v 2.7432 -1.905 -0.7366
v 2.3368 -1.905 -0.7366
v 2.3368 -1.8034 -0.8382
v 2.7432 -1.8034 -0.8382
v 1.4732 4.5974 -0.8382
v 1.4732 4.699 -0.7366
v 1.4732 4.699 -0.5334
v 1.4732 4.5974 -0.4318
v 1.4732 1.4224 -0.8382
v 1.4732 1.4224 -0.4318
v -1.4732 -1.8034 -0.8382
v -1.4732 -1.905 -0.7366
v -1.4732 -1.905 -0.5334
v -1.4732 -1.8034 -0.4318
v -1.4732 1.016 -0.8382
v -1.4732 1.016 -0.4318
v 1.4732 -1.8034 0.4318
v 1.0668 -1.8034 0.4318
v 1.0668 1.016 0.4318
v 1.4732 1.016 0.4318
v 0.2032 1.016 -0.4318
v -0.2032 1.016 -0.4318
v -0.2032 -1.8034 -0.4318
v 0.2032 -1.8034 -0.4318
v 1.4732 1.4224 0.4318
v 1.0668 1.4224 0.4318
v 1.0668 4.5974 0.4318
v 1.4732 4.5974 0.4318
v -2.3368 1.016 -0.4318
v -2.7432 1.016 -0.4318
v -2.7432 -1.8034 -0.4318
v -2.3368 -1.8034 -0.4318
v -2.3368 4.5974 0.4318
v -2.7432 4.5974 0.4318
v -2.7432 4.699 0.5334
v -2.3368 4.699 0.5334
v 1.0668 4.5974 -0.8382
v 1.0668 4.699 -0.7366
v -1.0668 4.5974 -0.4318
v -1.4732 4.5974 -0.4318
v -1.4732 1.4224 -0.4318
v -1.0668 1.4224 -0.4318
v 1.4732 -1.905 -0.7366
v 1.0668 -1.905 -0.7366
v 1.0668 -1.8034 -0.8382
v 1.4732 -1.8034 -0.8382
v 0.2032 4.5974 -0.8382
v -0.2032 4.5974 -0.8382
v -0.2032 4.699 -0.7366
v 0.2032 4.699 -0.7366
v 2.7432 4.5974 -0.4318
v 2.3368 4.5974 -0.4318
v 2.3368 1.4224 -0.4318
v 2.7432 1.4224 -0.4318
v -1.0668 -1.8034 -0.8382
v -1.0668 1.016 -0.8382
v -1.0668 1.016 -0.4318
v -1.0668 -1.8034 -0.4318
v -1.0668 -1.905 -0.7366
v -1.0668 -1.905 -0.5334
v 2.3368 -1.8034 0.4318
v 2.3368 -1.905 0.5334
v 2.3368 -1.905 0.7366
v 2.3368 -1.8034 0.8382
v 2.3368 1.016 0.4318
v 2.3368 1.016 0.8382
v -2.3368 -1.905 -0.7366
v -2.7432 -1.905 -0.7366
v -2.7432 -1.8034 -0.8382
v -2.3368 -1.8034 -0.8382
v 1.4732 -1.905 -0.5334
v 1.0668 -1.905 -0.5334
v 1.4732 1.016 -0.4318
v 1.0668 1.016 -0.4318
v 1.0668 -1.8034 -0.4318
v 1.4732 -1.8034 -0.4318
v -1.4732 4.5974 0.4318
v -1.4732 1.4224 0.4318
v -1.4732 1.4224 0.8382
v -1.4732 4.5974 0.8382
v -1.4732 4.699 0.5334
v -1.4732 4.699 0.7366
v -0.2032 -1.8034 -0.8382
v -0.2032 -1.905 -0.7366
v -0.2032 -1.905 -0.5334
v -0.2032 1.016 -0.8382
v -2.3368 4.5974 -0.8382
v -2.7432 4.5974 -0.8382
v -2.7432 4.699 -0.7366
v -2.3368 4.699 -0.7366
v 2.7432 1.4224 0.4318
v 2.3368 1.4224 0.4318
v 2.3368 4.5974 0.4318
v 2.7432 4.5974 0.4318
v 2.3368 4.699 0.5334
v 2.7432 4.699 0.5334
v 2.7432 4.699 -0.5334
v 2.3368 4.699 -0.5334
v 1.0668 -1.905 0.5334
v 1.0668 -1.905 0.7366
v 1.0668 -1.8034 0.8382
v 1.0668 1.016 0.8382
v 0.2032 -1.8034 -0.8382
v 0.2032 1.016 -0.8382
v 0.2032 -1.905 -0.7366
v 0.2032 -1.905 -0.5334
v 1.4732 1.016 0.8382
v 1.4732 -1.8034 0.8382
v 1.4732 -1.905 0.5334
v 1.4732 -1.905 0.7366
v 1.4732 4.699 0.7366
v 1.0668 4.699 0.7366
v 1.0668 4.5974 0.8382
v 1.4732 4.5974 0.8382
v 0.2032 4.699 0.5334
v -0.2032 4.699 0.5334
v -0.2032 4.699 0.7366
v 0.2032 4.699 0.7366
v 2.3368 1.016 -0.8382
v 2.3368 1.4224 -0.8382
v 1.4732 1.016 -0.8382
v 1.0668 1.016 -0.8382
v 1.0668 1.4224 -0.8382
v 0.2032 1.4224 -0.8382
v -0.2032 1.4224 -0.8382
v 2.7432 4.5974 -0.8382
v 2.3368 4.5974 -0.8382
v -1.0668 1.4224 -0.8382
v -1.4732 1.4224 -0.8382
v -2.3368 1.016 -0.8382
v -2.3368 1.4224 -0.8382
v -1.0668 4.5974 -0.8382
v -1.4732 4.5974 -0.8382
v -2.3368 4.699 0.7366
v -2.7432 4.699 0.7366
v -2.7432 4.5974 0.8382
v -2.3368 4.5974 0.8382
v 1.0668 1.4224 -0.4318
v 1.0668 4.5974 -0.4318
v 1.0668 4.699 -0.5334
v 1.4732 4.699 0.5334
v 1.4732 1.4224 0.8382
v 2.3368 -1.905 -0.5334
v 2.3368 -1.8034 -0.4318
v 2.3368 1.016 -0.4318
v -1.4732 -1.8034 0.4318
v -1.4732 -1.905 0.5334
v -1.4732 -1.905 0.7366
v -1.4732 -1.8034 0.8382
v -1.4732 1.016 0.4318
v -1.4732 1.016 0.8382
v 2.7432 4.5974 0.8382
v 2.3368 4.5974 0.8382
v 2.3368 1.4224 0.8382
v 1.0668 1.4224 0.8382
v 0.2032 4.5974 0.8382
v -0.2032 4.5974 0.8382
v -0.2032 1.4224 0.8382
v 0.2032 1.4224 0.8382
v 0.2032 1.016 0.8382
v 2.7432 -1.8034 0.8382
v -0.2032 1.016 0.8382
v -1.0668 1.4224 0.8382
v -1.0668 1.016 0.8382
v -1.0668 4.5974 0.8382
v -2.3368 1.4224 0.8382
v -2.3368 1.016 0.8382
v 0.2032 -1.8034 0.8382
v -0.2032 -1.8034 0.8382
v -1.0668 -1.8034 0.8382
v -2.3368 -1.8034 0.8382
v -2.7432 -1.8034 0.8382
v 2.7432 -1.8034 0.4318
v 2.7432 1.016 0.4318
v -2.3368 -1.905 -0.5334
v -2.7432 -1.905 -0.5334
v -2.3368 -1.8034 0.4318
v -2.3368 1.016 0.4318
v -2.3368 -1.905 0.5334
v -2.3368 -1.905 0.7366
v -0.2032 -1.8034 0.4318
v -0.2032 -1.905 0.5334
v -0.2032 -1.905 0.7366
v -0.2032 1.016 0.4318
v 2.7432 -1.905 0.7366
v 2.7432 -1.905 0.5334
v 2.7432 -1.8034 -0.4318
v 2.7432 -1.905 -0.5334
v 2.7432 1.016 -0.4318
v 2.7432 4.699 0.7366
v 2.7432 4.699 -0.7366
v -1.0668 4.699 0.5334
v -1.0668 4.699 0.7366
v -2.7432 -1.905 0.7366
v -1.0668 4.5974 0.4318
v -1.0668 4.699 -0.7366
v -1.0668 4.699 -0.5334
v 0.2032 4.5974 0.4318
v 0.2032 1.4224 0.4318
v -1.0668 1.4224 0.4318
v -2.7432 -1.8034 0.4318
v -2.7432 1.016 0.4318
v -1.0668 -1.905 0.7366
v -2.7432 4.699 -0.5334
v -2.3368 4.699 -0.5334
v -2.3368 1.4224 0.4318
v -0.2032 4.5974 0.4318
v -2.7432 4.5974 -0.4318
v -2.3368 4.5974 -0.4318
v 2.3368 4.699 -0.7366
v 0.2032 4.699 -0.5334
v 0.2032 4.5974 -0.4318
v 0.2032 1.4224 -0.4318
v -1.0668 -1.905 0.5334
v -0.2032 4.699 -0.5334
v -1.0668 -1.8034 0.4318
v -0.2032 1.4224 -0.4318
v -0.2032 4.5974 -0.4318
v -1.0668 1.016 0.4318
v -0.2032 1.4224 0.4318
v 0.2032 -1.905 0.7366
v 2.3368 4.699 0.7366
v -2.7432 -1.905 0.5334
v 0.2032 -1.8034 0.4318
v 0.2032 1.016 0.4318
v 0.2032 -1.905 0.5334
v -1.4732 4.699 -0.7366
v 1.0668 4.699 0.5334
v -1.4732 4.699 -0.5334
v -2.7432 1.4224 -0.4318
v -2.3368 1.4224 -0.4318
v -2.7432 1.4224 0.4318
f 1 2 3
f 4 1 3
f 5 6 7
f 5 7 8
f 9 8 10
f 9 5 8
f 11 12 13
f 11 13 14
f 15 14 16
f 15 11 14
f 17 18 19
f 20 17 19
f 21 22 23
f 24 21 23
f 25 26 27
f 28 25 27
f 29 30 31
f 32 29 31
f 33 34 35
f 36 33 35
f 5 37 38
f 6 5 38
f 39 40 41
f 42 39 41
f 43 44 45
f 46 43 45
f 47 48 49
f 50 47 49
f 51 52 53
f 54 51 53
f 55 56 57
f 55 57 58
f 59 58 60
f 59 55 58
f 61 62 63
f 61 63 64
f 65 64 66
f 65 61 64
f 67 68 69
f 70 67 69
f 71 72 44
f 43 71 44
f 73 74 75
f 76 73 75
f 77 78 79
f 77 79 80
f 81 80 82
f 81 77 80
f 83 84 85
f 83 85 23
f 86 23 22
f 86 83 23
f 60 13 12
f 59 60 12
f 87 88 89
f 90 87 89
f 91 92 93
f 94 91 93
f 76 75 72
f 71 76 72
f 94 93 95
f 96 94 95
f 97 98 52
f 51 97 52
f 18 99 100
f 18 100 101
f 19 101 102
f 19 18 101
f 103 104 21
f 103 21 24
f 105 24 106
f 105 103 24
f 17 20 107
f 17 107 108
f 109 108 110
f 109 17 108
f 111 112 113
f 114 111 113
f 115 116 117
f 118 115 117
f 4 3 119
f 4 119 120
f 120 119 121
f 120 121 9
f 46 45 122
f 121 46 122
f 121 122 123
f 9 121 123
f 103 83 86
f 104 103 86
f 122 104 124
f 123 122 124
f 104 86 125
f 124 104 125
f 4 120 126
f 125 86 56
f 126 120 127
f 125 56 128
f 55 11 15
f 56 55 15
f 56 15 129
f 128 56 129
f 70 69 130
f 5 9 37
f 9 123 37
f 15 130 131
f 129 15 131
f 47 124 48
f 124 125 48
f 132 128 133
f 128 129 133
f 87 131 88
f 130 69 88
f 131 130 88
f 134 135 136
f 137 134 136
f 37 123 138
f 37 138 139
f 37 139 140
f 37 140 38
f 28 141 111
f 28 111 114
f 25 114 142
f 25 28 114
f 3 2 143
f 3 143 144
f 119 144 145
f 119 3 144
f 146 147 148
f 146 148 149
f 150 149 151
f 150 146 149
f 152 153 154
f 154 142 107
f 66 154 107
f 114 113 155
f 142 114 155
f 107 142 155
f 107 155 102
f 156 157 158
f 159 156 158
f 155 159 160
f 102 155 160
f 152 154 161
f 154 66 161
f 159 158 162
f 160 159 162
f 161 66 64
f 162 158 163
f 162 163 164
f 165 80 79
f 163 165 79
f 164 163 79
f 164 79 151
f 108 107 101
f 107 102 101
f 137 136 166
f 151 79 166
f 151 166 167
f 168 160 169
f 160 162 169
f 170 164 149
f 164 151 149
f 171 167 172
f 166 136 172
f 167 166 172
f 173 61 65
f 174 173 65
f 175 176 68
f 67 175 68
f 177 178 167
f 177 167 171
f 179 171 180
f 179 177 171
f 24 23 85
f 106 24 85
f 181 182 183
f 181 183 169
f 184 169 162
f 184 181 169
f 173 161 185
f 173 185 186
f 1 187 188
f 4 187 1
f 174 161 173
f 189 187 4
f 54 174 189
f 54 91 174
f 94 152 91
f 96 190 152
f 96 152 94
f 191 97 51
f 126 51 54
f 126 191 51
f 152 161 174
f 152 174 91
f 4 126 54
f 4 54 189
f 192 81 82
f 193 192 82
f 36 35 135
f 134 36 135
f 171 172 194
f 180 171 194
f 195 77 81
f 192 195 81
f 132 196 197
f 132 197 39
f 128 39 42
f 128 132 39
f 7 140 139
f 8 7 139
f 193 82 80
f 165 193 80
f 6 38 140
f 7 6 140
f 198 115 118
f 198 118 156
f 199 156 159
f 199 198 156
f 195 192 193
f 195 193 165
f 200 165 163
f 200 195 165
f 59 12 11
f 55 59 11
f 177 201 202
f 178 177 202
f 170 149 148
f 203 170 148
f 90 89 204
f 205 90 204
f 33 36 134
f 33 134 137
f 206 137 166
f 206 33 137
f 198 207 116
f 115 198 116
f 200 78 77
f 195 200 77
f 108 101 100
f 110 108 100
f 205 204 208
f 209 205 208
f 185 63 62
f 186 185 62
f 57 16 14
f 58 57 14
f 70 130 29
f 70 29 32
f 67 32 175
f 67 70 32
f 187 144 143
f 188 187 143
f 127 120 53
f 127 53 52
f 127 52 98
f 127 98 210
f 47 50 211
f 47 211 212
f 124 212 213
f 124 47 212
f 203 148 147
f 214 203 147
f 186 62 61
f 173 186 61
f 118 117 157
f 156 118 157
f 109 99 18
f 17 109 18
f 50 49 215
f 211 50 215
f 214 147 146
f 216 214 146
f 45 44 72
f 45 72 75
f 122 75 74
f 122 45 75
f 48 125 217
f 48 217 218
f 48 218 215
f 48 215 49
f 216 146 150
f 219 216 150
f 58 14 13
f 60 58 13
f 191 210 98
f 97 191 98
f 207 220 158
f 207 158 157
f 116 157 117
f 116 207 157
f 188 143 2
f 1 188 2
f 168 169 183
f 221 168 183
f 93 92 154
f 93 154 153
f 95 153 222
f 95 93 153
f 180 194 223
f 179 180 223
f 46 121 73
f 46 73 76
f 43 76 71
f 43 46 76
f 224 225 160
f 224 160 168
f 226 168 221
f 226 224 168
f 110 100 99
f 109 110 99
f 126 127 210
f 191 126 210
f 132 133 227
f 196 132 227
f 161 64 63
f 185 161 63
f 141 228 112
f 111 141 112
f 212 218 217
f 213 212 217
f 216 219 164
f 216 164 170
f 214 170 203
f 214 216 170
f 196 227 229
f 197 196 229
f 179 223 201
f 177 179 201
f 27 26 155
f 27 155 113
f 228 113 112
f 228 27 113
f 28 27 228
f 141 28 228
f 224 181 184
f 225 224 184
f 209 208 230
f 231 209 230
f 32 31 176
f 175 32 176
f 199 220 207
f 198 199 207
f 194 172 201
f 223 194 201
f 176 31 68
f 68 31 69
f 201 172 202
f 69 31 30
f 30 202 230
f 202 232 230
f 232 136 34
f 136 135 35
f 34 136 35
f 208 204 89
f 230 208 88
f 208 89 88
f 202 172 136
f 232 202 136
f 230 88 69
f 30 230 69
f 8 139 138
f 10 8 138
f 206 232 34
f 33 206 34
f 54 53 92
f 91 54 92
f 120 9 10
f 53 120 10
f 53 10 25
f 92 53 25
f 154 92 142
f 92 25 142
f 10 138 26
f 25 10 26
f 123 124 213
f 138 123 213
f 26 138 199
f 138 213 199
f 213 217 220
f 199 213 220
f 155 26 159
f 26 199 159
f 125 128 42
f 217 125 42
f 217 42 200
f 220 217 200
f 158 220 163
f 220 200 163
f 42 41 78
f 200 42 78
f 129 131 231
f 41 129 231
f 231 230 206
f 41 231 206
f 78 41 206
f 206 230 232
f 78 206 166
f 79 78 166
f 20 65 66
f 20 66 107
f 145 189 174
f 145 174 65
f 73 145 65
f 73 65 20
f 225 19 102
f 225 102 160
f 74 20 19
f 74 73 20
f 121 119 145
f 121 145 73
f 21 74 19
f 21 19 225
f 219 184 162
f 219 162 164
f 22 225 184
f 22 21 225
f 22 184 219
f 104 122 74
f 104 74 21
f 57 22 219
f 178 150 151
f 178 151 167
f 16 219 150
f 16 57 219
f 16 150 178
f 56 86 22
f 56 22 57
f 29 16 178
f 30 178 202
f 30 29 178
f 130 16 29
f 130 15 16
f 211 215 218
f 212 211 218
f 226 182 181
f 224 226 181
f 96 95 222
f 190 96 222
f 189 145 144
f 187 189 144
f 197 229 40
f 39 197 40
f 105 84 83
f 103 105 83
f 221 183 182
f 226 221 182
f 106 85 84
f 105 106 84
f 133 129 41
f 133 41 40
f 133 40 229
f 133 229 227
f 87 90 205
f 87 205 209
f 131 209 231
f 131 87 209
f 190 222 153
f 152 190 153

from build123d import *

# Parameters (mm, degrees)
BOSS_EXTRUDE1_DEPTH      = 2.7432
BOSS_EXTRUDE1_DEPTH_BACK = 2.7432
CUT_EXTRUDE1_DEPTH       = 2.794
CUT_EXTRUDE1_DEPTH_BACK  = 2.794
CUT_EXTRUDE2_DEPTH       = 2.794
CUT_EXTRUDE2_DEPTH_BACK  = 2.794


with BuildPart() as part:
    # Sketch1 → Boss-Extrude1 (new, two sides: drawn at the far end of the back side and taken through both)
    with BuildSketch(Plane(origin=(0, 0, 0), x_dir=(0, 0, -1), z_dir=(1, 0, 0)).offset(-BOSS_EXTRUDE1_DEPTH_BACK)):
        Polygon((-0.8382, -1.8034), (-0.7366, -1.905), (-0.5334, -1.905), (-0.4318, -1.8034), (-0.4318, 1.016), (0.4318, 1.016), (0.4318, -1.8034), (0.5334, -1.905), (0.7366, -1.905), (0.8382, -1.8034), (0.8382, 4.5974), (0.7366, 4.699), (0.5334, 4.699), (0.4318, 4.5974), (0.4318, 1.4224), (-0.4318, 1.4224), (-0.4318, 4.5974), (-0.5334, 4.699), (-0.7366, 4.699), (-0.8382, 4.5974), align=None)
    extrude(amount=BOSS_EXTRUDE1_DEPTH + BOSS_EXTRUDE1_DEPTH_BACK)

    # Sketch2 → Cut-Extrude1 (cut, two sides: drawn at the far end of the back side and taken through both)
    with BuildSketch(Plane.XY.offset(-CUT_EXTRUDE1_DEPTH_BACK)):
        Polygon((-3.6068, -2.413), (4.0132, -2.413), (4.0132, -1.905), (3.6068, -1.905), (3.6068, 1.016), (2.7432, 1.016), (2.7432, -1.905), (2.3368, -1.905), (2.3368, 1.016), (1.4732, 1.016), (1.4732, -1.905), (1.0668, -1.905), (1.0668, 1.016), (0.2032, 1.016), (0.2032, -1.905), (-0.2032, -1.905), (-0.2032, 1.016), (-1.0668, 1.016), (-1.0668, -1.905), (-1.4732, -1.905), (-1.4732, 1.016), (-2.3368, 1.016), (-2.3368, -1.905), (-2.7432, -1.905), (-2.7432, 1.016), (-3.6068, 1.016), align=None)
    extrude(amount=CUT_EXTRUDE1_DEPTH + CUT_EXTRUDE1_DEPTH_BACK, mode=Mode.SUBTRACT)

    # Sketch3 → Cut-Extrude2 (cut, two sides: drawn at the far end of the back side and taken through both)
    with BuildSketch(Plane.XY.offset(-CUT_EXTRUDE2_DEPTH_BACK)):
        Polygon((-3.6068, 5.3594), (-3.6068, 1.4224), (-2.7432, 1.4224), (-2.7432, 4.8514), (-2.3368, 4.8514), (-2.3368, 1.4224), (-1.4732, 1.4224), (-1.4732, 4.8514), (-1.0668, 4.8514), (-1.0668, 1.4224), (-0.2032, 1.4224), (-0.2032, 4.8514), (0.2032, 4.8514), (0.2032, 1.4224), (1.0668, 1.4224), (1.0668, 4.8514), (1.4732, 4.8514), (1.4732, 1.4224), (2.3368, 1.4224), (2.3368, 4.8514), (2.7432, 4.8514), (2.7432, 1.4224), (3.6068, 1.4224), (3.6068, 4.8514), (4.0132, 4.8514), (4.0132, 5.3594), align=None)
    extrude(amount=CUT_EXTRUDE2_DEPTH + CUT_EXTRUDE2_DEPTH_BACK, mode=Mode.SUBTRACT)


solid = part.part
